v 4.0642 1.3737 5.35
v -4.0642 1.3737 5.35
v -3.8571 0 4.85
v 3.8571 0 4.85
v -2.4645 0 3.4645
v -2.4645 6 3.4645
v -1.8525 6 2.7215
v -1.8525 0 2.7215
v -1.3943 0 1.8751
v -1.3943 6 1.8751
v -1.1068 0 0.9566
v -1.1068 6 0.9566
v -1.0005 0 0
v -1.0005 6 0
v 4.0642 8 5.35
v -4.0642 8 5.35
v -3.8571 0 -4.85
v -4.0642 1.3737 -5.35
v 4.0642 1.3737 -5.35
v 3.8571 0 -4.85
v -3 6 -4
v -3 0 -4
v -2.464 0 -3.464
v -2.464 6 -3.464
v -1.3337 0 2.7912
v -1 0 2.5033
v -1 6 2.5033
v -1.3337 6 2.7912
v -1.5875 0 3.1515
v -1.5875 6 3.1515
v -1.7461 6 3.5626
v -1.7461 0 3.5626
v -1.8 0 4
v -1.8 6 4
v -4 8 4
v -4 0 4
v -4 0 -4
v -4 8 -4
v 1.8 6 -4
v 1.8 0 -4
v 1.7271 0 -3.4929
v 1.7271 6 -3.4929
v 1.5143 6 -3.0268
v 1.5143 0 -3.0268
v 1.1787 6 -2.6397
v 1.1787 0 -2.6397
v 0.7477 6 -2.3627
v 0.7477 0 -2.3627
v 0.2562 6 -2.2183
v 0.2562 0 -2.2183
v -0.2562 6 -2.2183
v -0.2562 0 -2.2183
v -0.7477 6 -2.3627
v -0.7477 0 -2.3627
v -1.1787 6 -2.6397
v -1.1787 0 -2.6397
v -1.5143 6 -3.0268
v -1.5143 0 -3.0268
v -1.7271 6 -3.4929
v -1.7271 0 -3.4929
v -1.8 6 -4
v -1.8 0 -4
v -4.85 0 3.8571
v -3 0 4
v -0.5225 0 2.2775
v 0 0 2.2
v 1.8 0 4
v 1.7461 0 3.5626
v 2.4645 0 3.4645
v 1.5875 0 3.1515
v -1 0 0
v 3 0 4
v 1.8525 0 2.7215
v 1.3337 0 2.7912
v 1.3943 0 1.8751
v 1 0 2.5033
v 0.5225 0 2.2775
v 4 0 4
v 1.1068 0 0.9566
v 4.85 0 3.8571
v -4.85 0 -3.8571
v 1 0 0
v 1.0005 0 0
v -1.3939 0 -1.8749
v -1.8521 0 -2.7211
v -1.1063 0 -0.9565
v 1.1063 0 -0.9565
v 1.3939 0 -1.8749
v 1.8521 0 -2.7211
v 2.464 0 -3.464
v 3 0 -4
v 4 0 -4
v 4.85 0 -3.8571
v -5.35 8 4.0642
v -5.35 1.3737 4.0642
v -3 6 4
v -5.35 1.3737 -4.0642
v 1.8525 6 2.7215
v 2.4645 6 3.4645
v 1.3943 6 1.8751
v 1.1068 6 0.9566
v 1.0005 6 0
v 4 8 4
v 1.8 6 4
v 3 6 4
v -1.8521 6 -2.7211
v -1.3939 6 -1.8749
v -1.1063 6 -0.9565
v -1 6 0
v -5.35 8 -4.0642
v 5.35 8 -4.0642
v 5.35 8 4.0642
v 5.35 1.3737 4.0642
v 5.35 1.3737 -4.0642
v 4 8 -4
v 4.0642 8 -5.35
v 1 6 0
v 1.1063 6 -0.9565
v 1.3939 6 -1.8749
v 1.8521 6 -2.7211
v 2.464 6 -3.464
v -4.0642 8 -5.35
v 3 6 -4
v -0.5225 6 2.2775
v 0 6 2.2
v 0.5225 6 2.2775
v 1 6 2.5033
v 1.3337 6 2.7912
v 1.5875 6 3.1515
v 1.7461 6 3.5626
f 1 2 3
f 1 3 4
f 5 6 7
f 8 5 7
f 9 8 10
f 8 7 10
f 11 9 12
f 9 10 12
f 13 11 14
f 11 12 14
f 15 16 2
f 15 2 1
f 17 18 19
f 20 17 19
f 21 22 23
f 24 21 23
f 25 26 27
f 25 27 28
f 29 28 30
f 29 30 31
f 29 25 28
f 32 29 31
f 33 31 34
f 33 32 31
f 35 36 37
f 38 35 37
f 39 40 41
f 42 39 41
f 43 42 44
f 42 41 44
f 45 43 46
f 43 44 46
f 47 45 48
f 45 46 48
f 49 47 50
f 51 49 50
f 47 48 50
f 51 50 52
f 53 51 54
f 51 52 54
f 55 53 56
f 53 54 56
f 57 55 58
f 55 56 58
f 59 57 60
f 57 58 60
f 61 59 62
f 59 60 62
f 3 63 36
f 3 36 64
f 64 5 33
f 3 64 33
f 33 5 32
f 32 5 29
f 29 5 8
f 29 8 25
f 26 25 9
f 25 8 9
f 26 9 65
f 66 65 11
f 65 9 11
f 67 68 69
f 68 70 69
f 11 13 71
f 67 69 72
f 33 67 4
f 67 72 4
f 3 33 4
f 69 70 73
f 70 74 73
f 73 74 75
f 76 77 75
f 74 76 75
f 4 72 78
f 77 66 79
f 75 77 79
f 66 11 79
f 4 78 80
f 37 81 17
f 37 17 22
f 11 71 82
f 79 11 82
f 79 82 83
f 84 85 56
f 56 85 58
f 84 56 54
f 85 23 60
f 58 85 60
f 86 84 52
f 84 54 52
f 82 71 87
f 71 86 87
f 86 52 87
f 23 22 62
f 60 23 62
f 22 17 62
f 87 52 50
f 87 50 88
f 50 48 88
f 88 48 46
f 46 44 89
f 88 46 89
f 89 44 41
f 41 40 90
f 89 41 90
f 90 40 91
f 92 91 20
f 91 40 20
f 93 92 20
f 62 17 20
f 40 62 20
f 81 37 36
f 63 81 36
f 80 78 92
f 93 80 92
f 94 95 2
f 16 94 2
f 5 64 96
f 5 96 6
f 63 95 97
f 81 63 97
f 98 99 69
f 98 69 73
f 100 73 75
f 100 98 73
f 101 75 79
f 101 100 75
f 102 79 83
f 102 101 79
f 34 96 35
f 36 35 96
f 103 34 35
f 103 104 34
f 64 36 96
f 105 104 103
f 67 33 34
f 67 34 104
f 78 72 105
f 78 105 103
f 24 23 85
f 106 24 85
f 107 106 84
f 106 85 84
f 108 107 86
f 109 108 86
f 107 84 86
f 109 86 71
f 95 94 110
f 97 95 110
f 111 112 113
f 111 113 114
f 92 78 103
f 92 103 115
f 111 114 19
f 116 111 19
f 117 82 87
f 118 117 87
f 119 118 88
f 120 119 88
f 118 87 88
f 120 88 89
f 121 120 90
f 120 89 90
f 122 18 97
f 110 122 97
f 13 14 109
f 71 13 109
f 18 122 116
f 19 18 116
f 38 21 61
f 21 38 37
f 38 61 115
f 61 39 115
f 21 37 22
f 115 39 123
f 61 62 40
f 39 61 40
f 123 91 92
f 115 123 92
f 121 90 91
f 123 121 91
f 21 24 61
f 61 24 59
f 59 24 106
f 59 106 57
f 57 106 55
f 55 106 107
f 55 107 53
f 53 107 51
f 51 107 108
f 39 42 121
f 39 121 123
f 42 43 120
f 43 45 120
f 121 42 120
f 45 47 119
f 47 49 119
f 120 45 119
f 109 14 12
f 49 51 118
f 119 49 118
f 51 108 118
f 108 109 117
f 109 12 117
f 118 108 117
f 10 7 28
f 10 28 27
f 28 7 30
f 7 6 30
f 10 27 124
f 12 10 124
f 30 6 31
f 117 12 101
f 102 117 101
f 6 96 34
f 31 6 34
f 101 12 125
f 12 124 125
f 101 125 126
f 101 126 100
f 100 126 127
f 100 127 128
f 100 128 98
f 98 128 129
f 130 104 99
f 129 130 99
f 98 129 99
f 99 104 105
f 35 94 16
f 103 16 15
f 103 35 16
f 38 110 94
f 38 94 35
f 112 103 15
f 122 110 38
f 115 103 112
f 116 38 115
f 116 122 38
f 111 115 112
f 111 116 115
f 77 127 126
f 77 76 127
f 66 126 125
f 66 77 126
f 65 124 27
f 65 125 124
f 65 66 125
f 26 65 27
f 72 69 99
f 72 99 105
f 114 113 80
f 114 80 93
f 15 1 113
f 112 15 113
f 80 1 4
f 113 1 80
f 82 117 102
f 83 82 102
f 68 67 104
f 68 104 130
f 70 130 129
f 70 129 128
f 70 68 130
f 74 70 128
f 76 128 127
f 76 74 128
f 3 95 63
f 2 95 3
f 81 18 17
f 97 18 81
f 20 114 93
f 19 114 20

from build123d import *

# Parameters (mm, degrees)
SKETCH1_W           = 8
SKETCH1_H           = 8
BOSS_EXTRUDE1_DEPTH = 8
BOSS_EXTRUDE2_DEPTH = 6
SKETCH3_OUTSIDE_W   = 19.406
SKETCH3_OUTSIDE_H   = 19.406
SKETCH3_OUTSIDE_W_2 = 10.7
SKETCH3_OUTSIDE_H_2 = 10.7
CUT_EXTRUDE2_DEPTH  = 13.354246922
CHAMFER1_SIZE       = 0.5
CHAMFER1_SIZE2      = 1.37373871
FILLET2_R           = 5
SKETCH6_W           = 8
SKETCH6_H           = 4
CUT_EXTRUDE4_DEPTH  = 12.011130732
MIRROR1_DEPTH       = 6
CUT_EXTRUDE5_DEPTH  = 10.656345064


# Read off the part's stored shape, not the designer's step: Mirror1
with BuildPart() as part:
    # Sketch1 → Boss-Extrude1 (new body)
    with BuildSketch(Plane(origin=(0, 0, 0), x_dir=(1, 0, 0), z_dir=(0, 1, 0))):
        Polygon((6.656854249, -2.757359313), (6.656854249, 2.757359313), (2.757359313, 6.656854249), (-2.757359313, 6.656854249), (-6.656854249, 2.757359313), (-6.656854249, -2.757359313), (-2.757359313, -6.656854249), (2.757359313, -6.656854249), align=None)
        Rectangle(SKETCH1_W, SKETCH1_H, mode=Mode.SUBTRACT)
    extrude(amount=BOSS_EXTRUDE1_DEPTH)

    # Sketch2 → Boss-Extrude2 (add)
    with BuildSketch(Plane.XZ):
        with BuildLine():
            Line((1, 2), (3, 4))
            Line((3, 4), (1.8, 4))
            ThreePointArc((1.8, 4), (0, 2.2), (-1.8, 4))
            Line((-1.8, 4), (-3, 4))
            Line((-3, 4), (-1, 2))
            Line((-1, 2), (-1, -4))
            Line((-1, -4), (1, -4))
            Line((1, -4), (1, 2))
        make_face()
    extrude(amount=-BOSS_EXTRUDE2_DEPTH)

    # Sketch3 outside → Cut-Extrude2 (cut, through all)
    with BuildSketch(Plane(origin=(0, 8, 0), x_dir=(1, 0, 0), z_dir=(0, 1, 0))):
        Rectangle(SKETCH3_OUTSIDE_W, SKETCH3_OUTSIDE_H)
        Rectangle(SKETCH3_OUTSIDE_W_2, SKETCH3_OUTSIDE_H_2, mode=Mode.SUBTRACT)
    extrude(amount=-CUT_EXTRUDE2_DEPTH, mode=Mode.SUBTRACT)

    # Chamfer1
    chamfer1_edges = [part.edges().sort_by_distance(p)[0] for p in [
        (-4.707106781, 0, 4.707106781),
        (-4.707106781, 0, -4.707106781),
        (4.707106781, 0, -4.707106781),
        (4.707106781, 0, 4.707106781),
        (5.35, 0, 0),
        (0, 0, -5.35),
        (-5.35, 0, 0),
        (0, 0, 5.35),
    ]]
    chamfer1_side = [part.faces().sort_by_distance(p)[0] for p in [
        (0, 0, -0.050506984),
    ]]
    chamfer(chamfer1_edges, length=CHAMFER1_SIZE, length2=CHAMFER1_SIZE2, reference=chamfer1_side[0])

    # Fillet2
    fillet2_edges = [part.edges().sort_by_distance(p)[0] for p in [
        (-1, 3, 2),
        (1, 3, 2),
    ]]
    fillet(fillet2_edges, radius=FILLET2_R)

    # Sketch6 → Cut-Extrude4 (cut, through all)
    with BuildSketch(Plane(origin=(0, 8, 0), x_dir=(1, 0, 0), z_dir=(0, 1, 0))):
        with Locations((0, 2)):
            Rectangle(SKETCH6_W, SKETCH6_H)
    extrude(amount=-CUT_EXTRUDE4_DEPTH, mode=Mode.SUBTRACT)

    # Mirror1 outline → Mirror1 (add)
    with BuildSketch(Plane(origin=(0, 0, 0), x_dir=(1, 0, 0), z_dir=(0, 1, 0))):
        with BuildLine():
            Line((-3, 4), (-2.463953695, 3.463953695))
            ThreePointArc((-2.463953695, 3.463953695), (-1.39390492, 1.874854522), (-1, 0))
            Line((-1, 0), (1, 0))
            ThreePointArc((1, 0), (1.39390492, 1.874854522), (2.463953695, 3.463953695))
            Line((2.463953695, 3.463953695), (3, 4))
            Line((3, 4), (1.8, 4))
            ThreePointArc((1.8, 4), (0, 2.2), (-1.8, 4))
            Line((-1.8, 4), (-3, 4))
        make_face()
        with BuildLine():
            Line((1, -4), (1, -2.503337045))
            ThreePointArc((1, -2.503337045), (0, -2.2), (-1, -2.503337045))
            Line((-1, -2.503337045), (-1, -4))
            Line((-1, -4), (1, -4))
        make_face()
    extrude(amount=MIRROR1_DEPTH)

    # Sketch8 → Cut-Extrude5 (cut, through all)
    with BuildSketch(Plane(origin=(0, 6, 0), x_dir=(1, 0, 0), z_dir=(0, 1, 0))):
        with BuildLine():
            Line((1.8, -4), (-1.8, -4))
            ThreePointArc((-1.8, -4), (0, -2.2), (1.8, -4))
        make_face()
    extrude(amount=-CUT_EXTRUDE5_DEPTH, mode=Mode.SUBTRACT)


solid = part.part
